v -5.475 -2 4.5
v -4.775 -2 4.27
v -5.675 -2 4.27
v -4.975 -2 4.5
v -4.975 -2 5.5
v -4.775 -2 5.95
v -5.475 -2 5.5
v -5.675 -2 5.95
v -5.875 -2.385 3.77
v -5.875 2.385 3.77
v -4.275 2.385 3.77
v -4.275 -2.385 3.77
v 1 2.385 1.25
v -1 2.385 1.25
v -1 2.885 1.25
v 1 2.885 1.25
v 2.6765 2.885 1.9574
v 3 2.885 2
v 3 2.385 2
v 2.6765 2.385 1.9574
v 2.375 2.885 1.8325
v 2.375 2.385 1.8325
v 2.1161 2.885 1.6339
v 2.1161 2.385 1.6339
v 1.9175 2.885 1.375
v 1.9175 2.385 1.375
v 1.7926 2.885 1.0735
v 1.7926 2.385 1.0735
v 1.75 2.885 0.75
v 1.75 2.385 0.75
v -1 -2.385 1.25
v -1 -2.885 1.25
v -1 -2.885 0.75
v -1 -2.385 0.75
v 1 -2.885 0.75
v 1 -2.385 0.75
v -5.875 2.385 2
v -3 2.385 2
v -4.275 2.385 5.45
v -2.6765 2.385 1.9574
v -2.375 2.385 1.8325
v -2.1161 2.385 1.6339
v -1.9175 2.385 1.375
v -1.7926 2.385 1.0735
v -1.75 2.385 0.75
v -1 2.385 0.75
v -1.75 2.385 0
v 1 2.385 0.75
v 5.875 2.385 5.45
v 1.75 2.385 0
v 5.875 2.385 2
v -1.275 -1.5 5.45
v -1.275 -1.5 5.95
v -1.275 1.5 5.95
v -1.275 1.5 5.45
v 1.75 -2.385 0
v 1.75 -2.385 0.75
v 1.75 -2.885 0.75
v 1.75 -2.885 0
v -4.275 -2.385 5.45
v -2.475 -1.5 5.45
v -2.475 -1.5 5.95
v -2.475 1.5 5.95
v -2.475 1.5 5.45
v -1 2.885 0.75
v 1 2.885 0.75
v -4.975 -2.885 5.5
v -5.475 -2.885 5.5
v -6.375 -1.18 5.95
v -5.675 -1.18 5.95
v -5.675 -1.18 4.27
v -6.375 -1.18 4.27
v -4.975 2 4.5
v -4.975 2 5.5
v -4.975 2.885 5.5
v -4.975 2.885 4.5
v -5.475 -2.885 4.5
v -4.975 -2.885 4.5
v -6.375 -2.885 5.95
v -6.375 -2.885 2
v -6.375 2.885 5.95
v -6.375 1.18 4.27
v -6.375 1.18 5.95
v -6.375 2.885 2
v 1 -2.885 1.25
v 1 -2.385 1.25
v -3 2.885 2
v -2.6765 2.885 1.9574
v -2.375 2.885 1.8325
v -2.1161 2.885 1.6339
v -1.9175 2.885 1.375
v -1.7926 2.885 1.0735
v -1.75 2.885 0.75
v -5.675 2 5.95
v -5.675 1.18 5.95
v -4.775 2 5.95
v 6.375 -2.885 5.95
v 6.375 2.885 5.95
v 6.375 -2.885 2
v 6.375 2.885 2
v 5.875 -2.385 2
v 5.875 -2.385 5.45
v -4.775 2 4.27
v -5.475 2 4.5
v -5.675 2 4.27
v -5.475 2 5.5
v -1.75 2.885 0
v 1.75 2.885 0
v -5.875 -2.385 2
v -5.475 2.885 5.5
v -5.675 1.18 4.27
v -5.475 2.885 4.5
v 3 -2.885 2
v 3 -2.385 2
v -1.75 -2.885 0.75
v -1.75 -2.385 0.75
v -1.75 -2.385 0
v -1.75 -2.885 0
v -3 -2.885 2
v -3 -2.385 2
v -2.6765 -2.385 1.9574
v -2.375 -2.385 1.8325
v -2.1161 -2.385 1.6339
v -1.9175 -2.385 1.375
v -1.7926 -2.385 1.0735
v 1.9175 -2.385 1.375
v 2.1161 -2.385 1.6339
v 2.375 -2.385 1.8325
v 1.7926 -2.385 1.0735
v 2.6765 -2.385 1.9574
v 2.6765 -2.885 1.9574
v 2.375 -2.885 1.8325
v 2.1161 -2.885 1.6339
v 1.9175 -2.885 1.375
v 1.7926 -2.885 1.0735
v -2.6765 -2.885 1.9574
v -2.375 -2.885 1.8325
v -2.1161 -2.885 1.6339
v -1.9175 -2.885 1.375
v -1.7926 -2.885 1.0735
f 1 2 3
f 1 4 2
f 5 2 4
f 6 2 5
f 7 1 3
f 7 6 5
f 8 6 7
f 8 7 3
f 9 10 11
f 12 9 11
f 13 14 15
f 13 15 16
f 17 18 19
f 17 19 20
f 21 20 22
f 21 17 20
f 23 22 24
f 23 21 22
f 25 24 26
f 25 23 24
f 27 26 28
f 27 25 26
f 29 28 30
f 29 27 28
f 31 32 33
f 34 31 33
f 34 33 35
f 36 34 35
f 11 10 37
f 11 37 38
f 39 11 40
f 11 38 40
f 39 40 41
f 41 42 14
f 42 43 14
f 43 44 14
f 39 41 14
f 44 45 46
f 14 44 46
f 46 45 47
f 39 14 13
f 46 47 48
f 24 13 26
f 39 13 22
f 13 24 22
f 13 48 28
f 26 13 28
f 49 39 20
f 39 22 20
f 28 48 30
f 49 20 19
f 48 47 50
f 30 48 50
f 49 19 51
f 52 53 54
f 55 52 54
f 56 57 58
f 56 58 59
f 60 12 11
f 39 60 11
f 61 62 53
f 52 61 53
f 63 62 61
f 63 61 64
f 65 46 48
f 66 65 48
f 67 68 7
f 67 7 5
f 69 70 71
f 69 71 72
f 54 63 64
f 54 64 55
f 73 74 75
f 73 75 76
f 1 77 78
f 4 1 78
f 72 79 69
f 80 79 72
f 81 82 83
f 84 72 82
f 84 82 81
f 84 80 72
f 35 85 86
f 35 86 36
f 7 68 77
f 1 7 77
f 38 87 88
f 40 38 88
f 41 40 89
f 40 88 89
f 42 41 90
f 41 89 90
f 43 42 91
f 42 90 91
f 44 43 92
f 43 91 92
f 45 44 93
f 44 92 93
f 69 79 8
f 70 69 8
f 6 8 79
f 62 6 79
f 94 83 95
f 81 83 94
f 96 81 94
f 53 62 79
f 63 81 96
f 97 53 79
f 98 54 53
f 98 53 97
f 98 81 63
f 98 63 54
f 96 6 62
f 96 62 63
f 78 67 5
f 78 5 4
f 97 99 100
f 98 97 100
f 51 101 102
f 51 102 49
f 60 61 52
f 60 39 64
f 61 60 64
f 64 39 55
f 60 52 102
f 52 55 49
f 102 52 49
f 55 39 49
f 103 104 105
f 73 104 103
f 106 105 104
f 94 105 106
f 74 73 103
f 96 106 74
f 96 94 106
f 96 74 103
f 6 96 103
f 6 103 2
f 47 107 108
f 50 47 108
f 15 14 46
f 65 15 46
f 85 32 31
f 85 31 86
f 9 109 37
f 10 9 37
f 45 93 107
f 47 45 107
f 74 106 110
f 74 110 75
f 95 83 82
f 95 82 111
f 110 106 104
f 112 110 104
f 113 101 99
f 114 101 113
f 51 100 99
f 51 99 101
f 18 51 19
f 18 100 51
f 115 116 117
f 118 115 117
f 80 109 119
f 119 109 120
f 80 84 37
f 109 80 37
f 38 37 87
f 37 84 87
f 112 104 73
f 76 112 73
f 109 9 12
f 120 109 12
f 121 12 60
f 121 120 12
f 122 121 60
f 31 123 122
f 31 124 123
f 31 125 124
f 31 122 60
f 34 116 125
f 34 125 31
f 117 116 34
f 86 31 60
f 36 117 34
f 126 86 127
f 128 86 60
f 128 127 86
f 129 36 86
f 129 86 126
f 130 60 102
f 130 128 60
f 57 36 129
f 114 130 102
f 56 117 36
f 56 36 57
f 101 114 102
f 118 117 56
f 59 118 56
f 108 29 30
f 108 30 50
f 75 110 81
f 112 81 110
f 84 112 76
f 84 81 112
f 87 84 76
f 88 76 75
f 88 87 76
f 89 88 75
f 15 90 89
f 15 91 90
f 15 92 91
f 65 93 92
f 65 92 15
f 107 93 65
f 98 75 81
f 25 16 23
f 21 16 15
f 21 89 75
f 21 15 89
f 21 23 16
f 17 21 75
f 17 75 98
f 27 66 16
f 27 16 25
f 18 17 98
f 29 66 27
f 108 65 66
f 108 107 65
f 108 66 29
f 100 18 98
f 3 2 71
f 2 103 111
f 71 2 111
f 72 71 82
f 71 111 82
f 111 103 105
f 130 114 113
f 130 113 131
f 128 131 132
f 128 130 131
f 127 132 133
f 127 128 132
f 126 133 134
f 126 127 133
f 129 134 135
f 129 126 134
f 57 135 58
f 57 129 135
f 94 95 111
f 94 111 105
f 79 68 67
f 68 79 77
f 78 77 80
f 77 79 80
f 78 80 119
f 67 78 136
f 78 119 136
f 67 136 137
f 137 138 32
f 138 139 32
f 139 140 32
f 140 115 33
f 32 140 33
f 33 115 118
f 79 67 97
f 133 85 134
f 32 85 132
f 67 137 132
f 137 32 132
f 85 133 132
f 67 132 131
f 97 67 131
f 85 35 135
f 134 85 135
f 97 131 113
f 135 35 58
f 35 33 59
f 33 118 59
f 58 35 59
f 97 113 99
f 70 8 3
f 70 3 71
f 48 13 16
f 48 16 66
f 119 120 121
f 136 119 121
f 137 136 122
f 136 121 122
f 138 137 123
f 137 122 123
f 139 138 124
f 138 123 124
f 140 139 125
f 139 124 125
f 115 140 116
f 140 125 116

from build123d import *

# Parameters (mm, degrees)
ESQUISSE1_W                  = 12.75
ESQUISSE1_H                  = 5.77
BASE_EXTRUSION_DEPTH         = 5.95
ENL_V_MAT_EXTRU_1_DEPTH      = 1.68
COQUE1_OUTLINE_W             = 10.15
COQUE1_OUTLINE_H             = 4.77
COQUE1_DEPTH                 = 5.45
COQUE1_2_OUTLINE_W           = 1.6
COQUE1_2_OUTLINE_H           = 4.77
COQUE1_2_DEPTH               = 3.77
ENL_V_MAT_EXTRU_2_DEPTH      = 10.185115677
ENL_V_MAT_EXTRU_3_DEPTH      = 10.185115677
ENL_V_MAT_EXTRU_3_DEPTH_BACK = 10.185115677
ESQUISSE4_W                  = 2
ESQUISSE4_H                  = 0.5
ESQUISSE4_W_2                = 0.5
ESQUISSE4_H_2                = 1
ESQUISSE5_W                  = 1.2
ESQUISSE5_H                  = 3
ENL_V_MAT_EXTRU_4_DEPTH      = 10.185115677


# Read off the part's stored shape, not the designer's step: Coque1
with BuildPart() as part:
    # Esquisse1 → Base-Extrusion (new body)
    with BuildSketch(Plane.XY):
        Rectangle(ESQUISSE1_W, ESQUISSE1_H)
    extrude(amount=BASE_EXTRUSION_DEPTH)

    # Esquisse2 → Enlèv. mat.-Extru.1 (cut)
    with BuildSketch(Plane.XY.offset(5.95)):
        Polygon((-5.675, 2), (-4.775, 2), (-4.775, -2), (-5.675, -2), (-5.675, -1.18), (-6.375, -1.18), (-6.375, 1.18), (-5.675, 1.18), align=None)
    extrude(amount=-ENL_V_MAT_EXTRU_1_DEPTH, mode=Mode.SUBTRACT)

    # Coque1 outline → Coque1 (cut)
    with BuildSketch(Plane.XY):
        with Locations((0.8, 0)):
            Rectangle(COQUE1_OUTLINE_W, COQUE1_OUTLINE_H)
    extrude(amount=COQUE1_DEPTH, mode=Mode.SUBTRACT)

    # Coque1 2 outline → Coque1 2 (cut)
    with BuildSketch(Plane.XY):
        with Locations((-5.075, 0)):
            Rectangle(COQUE1_2_OUTLINE_W, COQUE1_2_OUTLINE_H)
    extrude(amount=COQUE1_2_DEPTH, mode=Mode.SUBTRACT)

    # Esquisse3 → Enlèv. mat.-Extru.2 (cut, symmetric)
    with BuildSketch(Plane(origin=(0, 0, 0), x_dir=(1, 0, 0), z_dir=(0, 1, 0))):
        with BuildLine():
            Line((6.375, -2), (3, -2))
            ThreePointArc((3, -2), (2.116116524, -1.633883476), (1.75, -0.75))
            Line((1.75, -0.75), (1.75, 0))
            Line((1.75, 0), (6.375, 0))
            Line((6.375, 0), (6.375, -2))
        make_face()
    enl_v_mat_extru_2 = extrude(amount=ENL_V_MAT_EXTRU_2_DEPTH, both=True, mode=Mode.SUBTRACT)

    # Symétrie1: Enlèv. mat.-Extru.2 across plane
    add(enl_v_mat_extru_2.mirror(Plane(origin=(0, 0, 0), x_dir=(0, 0, 1), z_dir=(1, 0, 0))), mode=Mode.SUBTRACT)

    # Esquisse4 → Enlèv. mat.-Extru.3 (cut, two sides: drawn at the far end of the back side and taken through both)
    with BuildSketch(Plane(origin=(0, 0, 0), x_dir=(1, 0, 0), z_dir=(0, 1, 0)).offset(-ENL_V_MAT_EXTRU_3_DEPTH_BACK)):
        with Locations((0, -1)):
            Rectangle(ESQUISSE4_W, ESQUISSE4_H)
        with Locations((-5.225, -5)):
            Rectangle(ESQUISSE4_W_2, ESQUISSE4_H_2)
    extrude(amount=ENL_V_MAT_EXTRU_3_DEPTH + ENL_V_MAT_EXTRU_3_DEPTH_BACK, mode=Mode.SUBTRACT)

    # Esquisse5 → Enlèv. mat.-Extru.4 (cut, through all)
    with BuildSketch(Plane.XY.offset(5.95)):
        with Locations((-1.875, 0)):
            Rectangle(ESQUISSE5_W, ESQUISSE5_H)
    extrude(amount=-ENL_V_MAT_EXTRU_4_DEPTH, mode=Mode.SUBTRACT)


solid = part.part
